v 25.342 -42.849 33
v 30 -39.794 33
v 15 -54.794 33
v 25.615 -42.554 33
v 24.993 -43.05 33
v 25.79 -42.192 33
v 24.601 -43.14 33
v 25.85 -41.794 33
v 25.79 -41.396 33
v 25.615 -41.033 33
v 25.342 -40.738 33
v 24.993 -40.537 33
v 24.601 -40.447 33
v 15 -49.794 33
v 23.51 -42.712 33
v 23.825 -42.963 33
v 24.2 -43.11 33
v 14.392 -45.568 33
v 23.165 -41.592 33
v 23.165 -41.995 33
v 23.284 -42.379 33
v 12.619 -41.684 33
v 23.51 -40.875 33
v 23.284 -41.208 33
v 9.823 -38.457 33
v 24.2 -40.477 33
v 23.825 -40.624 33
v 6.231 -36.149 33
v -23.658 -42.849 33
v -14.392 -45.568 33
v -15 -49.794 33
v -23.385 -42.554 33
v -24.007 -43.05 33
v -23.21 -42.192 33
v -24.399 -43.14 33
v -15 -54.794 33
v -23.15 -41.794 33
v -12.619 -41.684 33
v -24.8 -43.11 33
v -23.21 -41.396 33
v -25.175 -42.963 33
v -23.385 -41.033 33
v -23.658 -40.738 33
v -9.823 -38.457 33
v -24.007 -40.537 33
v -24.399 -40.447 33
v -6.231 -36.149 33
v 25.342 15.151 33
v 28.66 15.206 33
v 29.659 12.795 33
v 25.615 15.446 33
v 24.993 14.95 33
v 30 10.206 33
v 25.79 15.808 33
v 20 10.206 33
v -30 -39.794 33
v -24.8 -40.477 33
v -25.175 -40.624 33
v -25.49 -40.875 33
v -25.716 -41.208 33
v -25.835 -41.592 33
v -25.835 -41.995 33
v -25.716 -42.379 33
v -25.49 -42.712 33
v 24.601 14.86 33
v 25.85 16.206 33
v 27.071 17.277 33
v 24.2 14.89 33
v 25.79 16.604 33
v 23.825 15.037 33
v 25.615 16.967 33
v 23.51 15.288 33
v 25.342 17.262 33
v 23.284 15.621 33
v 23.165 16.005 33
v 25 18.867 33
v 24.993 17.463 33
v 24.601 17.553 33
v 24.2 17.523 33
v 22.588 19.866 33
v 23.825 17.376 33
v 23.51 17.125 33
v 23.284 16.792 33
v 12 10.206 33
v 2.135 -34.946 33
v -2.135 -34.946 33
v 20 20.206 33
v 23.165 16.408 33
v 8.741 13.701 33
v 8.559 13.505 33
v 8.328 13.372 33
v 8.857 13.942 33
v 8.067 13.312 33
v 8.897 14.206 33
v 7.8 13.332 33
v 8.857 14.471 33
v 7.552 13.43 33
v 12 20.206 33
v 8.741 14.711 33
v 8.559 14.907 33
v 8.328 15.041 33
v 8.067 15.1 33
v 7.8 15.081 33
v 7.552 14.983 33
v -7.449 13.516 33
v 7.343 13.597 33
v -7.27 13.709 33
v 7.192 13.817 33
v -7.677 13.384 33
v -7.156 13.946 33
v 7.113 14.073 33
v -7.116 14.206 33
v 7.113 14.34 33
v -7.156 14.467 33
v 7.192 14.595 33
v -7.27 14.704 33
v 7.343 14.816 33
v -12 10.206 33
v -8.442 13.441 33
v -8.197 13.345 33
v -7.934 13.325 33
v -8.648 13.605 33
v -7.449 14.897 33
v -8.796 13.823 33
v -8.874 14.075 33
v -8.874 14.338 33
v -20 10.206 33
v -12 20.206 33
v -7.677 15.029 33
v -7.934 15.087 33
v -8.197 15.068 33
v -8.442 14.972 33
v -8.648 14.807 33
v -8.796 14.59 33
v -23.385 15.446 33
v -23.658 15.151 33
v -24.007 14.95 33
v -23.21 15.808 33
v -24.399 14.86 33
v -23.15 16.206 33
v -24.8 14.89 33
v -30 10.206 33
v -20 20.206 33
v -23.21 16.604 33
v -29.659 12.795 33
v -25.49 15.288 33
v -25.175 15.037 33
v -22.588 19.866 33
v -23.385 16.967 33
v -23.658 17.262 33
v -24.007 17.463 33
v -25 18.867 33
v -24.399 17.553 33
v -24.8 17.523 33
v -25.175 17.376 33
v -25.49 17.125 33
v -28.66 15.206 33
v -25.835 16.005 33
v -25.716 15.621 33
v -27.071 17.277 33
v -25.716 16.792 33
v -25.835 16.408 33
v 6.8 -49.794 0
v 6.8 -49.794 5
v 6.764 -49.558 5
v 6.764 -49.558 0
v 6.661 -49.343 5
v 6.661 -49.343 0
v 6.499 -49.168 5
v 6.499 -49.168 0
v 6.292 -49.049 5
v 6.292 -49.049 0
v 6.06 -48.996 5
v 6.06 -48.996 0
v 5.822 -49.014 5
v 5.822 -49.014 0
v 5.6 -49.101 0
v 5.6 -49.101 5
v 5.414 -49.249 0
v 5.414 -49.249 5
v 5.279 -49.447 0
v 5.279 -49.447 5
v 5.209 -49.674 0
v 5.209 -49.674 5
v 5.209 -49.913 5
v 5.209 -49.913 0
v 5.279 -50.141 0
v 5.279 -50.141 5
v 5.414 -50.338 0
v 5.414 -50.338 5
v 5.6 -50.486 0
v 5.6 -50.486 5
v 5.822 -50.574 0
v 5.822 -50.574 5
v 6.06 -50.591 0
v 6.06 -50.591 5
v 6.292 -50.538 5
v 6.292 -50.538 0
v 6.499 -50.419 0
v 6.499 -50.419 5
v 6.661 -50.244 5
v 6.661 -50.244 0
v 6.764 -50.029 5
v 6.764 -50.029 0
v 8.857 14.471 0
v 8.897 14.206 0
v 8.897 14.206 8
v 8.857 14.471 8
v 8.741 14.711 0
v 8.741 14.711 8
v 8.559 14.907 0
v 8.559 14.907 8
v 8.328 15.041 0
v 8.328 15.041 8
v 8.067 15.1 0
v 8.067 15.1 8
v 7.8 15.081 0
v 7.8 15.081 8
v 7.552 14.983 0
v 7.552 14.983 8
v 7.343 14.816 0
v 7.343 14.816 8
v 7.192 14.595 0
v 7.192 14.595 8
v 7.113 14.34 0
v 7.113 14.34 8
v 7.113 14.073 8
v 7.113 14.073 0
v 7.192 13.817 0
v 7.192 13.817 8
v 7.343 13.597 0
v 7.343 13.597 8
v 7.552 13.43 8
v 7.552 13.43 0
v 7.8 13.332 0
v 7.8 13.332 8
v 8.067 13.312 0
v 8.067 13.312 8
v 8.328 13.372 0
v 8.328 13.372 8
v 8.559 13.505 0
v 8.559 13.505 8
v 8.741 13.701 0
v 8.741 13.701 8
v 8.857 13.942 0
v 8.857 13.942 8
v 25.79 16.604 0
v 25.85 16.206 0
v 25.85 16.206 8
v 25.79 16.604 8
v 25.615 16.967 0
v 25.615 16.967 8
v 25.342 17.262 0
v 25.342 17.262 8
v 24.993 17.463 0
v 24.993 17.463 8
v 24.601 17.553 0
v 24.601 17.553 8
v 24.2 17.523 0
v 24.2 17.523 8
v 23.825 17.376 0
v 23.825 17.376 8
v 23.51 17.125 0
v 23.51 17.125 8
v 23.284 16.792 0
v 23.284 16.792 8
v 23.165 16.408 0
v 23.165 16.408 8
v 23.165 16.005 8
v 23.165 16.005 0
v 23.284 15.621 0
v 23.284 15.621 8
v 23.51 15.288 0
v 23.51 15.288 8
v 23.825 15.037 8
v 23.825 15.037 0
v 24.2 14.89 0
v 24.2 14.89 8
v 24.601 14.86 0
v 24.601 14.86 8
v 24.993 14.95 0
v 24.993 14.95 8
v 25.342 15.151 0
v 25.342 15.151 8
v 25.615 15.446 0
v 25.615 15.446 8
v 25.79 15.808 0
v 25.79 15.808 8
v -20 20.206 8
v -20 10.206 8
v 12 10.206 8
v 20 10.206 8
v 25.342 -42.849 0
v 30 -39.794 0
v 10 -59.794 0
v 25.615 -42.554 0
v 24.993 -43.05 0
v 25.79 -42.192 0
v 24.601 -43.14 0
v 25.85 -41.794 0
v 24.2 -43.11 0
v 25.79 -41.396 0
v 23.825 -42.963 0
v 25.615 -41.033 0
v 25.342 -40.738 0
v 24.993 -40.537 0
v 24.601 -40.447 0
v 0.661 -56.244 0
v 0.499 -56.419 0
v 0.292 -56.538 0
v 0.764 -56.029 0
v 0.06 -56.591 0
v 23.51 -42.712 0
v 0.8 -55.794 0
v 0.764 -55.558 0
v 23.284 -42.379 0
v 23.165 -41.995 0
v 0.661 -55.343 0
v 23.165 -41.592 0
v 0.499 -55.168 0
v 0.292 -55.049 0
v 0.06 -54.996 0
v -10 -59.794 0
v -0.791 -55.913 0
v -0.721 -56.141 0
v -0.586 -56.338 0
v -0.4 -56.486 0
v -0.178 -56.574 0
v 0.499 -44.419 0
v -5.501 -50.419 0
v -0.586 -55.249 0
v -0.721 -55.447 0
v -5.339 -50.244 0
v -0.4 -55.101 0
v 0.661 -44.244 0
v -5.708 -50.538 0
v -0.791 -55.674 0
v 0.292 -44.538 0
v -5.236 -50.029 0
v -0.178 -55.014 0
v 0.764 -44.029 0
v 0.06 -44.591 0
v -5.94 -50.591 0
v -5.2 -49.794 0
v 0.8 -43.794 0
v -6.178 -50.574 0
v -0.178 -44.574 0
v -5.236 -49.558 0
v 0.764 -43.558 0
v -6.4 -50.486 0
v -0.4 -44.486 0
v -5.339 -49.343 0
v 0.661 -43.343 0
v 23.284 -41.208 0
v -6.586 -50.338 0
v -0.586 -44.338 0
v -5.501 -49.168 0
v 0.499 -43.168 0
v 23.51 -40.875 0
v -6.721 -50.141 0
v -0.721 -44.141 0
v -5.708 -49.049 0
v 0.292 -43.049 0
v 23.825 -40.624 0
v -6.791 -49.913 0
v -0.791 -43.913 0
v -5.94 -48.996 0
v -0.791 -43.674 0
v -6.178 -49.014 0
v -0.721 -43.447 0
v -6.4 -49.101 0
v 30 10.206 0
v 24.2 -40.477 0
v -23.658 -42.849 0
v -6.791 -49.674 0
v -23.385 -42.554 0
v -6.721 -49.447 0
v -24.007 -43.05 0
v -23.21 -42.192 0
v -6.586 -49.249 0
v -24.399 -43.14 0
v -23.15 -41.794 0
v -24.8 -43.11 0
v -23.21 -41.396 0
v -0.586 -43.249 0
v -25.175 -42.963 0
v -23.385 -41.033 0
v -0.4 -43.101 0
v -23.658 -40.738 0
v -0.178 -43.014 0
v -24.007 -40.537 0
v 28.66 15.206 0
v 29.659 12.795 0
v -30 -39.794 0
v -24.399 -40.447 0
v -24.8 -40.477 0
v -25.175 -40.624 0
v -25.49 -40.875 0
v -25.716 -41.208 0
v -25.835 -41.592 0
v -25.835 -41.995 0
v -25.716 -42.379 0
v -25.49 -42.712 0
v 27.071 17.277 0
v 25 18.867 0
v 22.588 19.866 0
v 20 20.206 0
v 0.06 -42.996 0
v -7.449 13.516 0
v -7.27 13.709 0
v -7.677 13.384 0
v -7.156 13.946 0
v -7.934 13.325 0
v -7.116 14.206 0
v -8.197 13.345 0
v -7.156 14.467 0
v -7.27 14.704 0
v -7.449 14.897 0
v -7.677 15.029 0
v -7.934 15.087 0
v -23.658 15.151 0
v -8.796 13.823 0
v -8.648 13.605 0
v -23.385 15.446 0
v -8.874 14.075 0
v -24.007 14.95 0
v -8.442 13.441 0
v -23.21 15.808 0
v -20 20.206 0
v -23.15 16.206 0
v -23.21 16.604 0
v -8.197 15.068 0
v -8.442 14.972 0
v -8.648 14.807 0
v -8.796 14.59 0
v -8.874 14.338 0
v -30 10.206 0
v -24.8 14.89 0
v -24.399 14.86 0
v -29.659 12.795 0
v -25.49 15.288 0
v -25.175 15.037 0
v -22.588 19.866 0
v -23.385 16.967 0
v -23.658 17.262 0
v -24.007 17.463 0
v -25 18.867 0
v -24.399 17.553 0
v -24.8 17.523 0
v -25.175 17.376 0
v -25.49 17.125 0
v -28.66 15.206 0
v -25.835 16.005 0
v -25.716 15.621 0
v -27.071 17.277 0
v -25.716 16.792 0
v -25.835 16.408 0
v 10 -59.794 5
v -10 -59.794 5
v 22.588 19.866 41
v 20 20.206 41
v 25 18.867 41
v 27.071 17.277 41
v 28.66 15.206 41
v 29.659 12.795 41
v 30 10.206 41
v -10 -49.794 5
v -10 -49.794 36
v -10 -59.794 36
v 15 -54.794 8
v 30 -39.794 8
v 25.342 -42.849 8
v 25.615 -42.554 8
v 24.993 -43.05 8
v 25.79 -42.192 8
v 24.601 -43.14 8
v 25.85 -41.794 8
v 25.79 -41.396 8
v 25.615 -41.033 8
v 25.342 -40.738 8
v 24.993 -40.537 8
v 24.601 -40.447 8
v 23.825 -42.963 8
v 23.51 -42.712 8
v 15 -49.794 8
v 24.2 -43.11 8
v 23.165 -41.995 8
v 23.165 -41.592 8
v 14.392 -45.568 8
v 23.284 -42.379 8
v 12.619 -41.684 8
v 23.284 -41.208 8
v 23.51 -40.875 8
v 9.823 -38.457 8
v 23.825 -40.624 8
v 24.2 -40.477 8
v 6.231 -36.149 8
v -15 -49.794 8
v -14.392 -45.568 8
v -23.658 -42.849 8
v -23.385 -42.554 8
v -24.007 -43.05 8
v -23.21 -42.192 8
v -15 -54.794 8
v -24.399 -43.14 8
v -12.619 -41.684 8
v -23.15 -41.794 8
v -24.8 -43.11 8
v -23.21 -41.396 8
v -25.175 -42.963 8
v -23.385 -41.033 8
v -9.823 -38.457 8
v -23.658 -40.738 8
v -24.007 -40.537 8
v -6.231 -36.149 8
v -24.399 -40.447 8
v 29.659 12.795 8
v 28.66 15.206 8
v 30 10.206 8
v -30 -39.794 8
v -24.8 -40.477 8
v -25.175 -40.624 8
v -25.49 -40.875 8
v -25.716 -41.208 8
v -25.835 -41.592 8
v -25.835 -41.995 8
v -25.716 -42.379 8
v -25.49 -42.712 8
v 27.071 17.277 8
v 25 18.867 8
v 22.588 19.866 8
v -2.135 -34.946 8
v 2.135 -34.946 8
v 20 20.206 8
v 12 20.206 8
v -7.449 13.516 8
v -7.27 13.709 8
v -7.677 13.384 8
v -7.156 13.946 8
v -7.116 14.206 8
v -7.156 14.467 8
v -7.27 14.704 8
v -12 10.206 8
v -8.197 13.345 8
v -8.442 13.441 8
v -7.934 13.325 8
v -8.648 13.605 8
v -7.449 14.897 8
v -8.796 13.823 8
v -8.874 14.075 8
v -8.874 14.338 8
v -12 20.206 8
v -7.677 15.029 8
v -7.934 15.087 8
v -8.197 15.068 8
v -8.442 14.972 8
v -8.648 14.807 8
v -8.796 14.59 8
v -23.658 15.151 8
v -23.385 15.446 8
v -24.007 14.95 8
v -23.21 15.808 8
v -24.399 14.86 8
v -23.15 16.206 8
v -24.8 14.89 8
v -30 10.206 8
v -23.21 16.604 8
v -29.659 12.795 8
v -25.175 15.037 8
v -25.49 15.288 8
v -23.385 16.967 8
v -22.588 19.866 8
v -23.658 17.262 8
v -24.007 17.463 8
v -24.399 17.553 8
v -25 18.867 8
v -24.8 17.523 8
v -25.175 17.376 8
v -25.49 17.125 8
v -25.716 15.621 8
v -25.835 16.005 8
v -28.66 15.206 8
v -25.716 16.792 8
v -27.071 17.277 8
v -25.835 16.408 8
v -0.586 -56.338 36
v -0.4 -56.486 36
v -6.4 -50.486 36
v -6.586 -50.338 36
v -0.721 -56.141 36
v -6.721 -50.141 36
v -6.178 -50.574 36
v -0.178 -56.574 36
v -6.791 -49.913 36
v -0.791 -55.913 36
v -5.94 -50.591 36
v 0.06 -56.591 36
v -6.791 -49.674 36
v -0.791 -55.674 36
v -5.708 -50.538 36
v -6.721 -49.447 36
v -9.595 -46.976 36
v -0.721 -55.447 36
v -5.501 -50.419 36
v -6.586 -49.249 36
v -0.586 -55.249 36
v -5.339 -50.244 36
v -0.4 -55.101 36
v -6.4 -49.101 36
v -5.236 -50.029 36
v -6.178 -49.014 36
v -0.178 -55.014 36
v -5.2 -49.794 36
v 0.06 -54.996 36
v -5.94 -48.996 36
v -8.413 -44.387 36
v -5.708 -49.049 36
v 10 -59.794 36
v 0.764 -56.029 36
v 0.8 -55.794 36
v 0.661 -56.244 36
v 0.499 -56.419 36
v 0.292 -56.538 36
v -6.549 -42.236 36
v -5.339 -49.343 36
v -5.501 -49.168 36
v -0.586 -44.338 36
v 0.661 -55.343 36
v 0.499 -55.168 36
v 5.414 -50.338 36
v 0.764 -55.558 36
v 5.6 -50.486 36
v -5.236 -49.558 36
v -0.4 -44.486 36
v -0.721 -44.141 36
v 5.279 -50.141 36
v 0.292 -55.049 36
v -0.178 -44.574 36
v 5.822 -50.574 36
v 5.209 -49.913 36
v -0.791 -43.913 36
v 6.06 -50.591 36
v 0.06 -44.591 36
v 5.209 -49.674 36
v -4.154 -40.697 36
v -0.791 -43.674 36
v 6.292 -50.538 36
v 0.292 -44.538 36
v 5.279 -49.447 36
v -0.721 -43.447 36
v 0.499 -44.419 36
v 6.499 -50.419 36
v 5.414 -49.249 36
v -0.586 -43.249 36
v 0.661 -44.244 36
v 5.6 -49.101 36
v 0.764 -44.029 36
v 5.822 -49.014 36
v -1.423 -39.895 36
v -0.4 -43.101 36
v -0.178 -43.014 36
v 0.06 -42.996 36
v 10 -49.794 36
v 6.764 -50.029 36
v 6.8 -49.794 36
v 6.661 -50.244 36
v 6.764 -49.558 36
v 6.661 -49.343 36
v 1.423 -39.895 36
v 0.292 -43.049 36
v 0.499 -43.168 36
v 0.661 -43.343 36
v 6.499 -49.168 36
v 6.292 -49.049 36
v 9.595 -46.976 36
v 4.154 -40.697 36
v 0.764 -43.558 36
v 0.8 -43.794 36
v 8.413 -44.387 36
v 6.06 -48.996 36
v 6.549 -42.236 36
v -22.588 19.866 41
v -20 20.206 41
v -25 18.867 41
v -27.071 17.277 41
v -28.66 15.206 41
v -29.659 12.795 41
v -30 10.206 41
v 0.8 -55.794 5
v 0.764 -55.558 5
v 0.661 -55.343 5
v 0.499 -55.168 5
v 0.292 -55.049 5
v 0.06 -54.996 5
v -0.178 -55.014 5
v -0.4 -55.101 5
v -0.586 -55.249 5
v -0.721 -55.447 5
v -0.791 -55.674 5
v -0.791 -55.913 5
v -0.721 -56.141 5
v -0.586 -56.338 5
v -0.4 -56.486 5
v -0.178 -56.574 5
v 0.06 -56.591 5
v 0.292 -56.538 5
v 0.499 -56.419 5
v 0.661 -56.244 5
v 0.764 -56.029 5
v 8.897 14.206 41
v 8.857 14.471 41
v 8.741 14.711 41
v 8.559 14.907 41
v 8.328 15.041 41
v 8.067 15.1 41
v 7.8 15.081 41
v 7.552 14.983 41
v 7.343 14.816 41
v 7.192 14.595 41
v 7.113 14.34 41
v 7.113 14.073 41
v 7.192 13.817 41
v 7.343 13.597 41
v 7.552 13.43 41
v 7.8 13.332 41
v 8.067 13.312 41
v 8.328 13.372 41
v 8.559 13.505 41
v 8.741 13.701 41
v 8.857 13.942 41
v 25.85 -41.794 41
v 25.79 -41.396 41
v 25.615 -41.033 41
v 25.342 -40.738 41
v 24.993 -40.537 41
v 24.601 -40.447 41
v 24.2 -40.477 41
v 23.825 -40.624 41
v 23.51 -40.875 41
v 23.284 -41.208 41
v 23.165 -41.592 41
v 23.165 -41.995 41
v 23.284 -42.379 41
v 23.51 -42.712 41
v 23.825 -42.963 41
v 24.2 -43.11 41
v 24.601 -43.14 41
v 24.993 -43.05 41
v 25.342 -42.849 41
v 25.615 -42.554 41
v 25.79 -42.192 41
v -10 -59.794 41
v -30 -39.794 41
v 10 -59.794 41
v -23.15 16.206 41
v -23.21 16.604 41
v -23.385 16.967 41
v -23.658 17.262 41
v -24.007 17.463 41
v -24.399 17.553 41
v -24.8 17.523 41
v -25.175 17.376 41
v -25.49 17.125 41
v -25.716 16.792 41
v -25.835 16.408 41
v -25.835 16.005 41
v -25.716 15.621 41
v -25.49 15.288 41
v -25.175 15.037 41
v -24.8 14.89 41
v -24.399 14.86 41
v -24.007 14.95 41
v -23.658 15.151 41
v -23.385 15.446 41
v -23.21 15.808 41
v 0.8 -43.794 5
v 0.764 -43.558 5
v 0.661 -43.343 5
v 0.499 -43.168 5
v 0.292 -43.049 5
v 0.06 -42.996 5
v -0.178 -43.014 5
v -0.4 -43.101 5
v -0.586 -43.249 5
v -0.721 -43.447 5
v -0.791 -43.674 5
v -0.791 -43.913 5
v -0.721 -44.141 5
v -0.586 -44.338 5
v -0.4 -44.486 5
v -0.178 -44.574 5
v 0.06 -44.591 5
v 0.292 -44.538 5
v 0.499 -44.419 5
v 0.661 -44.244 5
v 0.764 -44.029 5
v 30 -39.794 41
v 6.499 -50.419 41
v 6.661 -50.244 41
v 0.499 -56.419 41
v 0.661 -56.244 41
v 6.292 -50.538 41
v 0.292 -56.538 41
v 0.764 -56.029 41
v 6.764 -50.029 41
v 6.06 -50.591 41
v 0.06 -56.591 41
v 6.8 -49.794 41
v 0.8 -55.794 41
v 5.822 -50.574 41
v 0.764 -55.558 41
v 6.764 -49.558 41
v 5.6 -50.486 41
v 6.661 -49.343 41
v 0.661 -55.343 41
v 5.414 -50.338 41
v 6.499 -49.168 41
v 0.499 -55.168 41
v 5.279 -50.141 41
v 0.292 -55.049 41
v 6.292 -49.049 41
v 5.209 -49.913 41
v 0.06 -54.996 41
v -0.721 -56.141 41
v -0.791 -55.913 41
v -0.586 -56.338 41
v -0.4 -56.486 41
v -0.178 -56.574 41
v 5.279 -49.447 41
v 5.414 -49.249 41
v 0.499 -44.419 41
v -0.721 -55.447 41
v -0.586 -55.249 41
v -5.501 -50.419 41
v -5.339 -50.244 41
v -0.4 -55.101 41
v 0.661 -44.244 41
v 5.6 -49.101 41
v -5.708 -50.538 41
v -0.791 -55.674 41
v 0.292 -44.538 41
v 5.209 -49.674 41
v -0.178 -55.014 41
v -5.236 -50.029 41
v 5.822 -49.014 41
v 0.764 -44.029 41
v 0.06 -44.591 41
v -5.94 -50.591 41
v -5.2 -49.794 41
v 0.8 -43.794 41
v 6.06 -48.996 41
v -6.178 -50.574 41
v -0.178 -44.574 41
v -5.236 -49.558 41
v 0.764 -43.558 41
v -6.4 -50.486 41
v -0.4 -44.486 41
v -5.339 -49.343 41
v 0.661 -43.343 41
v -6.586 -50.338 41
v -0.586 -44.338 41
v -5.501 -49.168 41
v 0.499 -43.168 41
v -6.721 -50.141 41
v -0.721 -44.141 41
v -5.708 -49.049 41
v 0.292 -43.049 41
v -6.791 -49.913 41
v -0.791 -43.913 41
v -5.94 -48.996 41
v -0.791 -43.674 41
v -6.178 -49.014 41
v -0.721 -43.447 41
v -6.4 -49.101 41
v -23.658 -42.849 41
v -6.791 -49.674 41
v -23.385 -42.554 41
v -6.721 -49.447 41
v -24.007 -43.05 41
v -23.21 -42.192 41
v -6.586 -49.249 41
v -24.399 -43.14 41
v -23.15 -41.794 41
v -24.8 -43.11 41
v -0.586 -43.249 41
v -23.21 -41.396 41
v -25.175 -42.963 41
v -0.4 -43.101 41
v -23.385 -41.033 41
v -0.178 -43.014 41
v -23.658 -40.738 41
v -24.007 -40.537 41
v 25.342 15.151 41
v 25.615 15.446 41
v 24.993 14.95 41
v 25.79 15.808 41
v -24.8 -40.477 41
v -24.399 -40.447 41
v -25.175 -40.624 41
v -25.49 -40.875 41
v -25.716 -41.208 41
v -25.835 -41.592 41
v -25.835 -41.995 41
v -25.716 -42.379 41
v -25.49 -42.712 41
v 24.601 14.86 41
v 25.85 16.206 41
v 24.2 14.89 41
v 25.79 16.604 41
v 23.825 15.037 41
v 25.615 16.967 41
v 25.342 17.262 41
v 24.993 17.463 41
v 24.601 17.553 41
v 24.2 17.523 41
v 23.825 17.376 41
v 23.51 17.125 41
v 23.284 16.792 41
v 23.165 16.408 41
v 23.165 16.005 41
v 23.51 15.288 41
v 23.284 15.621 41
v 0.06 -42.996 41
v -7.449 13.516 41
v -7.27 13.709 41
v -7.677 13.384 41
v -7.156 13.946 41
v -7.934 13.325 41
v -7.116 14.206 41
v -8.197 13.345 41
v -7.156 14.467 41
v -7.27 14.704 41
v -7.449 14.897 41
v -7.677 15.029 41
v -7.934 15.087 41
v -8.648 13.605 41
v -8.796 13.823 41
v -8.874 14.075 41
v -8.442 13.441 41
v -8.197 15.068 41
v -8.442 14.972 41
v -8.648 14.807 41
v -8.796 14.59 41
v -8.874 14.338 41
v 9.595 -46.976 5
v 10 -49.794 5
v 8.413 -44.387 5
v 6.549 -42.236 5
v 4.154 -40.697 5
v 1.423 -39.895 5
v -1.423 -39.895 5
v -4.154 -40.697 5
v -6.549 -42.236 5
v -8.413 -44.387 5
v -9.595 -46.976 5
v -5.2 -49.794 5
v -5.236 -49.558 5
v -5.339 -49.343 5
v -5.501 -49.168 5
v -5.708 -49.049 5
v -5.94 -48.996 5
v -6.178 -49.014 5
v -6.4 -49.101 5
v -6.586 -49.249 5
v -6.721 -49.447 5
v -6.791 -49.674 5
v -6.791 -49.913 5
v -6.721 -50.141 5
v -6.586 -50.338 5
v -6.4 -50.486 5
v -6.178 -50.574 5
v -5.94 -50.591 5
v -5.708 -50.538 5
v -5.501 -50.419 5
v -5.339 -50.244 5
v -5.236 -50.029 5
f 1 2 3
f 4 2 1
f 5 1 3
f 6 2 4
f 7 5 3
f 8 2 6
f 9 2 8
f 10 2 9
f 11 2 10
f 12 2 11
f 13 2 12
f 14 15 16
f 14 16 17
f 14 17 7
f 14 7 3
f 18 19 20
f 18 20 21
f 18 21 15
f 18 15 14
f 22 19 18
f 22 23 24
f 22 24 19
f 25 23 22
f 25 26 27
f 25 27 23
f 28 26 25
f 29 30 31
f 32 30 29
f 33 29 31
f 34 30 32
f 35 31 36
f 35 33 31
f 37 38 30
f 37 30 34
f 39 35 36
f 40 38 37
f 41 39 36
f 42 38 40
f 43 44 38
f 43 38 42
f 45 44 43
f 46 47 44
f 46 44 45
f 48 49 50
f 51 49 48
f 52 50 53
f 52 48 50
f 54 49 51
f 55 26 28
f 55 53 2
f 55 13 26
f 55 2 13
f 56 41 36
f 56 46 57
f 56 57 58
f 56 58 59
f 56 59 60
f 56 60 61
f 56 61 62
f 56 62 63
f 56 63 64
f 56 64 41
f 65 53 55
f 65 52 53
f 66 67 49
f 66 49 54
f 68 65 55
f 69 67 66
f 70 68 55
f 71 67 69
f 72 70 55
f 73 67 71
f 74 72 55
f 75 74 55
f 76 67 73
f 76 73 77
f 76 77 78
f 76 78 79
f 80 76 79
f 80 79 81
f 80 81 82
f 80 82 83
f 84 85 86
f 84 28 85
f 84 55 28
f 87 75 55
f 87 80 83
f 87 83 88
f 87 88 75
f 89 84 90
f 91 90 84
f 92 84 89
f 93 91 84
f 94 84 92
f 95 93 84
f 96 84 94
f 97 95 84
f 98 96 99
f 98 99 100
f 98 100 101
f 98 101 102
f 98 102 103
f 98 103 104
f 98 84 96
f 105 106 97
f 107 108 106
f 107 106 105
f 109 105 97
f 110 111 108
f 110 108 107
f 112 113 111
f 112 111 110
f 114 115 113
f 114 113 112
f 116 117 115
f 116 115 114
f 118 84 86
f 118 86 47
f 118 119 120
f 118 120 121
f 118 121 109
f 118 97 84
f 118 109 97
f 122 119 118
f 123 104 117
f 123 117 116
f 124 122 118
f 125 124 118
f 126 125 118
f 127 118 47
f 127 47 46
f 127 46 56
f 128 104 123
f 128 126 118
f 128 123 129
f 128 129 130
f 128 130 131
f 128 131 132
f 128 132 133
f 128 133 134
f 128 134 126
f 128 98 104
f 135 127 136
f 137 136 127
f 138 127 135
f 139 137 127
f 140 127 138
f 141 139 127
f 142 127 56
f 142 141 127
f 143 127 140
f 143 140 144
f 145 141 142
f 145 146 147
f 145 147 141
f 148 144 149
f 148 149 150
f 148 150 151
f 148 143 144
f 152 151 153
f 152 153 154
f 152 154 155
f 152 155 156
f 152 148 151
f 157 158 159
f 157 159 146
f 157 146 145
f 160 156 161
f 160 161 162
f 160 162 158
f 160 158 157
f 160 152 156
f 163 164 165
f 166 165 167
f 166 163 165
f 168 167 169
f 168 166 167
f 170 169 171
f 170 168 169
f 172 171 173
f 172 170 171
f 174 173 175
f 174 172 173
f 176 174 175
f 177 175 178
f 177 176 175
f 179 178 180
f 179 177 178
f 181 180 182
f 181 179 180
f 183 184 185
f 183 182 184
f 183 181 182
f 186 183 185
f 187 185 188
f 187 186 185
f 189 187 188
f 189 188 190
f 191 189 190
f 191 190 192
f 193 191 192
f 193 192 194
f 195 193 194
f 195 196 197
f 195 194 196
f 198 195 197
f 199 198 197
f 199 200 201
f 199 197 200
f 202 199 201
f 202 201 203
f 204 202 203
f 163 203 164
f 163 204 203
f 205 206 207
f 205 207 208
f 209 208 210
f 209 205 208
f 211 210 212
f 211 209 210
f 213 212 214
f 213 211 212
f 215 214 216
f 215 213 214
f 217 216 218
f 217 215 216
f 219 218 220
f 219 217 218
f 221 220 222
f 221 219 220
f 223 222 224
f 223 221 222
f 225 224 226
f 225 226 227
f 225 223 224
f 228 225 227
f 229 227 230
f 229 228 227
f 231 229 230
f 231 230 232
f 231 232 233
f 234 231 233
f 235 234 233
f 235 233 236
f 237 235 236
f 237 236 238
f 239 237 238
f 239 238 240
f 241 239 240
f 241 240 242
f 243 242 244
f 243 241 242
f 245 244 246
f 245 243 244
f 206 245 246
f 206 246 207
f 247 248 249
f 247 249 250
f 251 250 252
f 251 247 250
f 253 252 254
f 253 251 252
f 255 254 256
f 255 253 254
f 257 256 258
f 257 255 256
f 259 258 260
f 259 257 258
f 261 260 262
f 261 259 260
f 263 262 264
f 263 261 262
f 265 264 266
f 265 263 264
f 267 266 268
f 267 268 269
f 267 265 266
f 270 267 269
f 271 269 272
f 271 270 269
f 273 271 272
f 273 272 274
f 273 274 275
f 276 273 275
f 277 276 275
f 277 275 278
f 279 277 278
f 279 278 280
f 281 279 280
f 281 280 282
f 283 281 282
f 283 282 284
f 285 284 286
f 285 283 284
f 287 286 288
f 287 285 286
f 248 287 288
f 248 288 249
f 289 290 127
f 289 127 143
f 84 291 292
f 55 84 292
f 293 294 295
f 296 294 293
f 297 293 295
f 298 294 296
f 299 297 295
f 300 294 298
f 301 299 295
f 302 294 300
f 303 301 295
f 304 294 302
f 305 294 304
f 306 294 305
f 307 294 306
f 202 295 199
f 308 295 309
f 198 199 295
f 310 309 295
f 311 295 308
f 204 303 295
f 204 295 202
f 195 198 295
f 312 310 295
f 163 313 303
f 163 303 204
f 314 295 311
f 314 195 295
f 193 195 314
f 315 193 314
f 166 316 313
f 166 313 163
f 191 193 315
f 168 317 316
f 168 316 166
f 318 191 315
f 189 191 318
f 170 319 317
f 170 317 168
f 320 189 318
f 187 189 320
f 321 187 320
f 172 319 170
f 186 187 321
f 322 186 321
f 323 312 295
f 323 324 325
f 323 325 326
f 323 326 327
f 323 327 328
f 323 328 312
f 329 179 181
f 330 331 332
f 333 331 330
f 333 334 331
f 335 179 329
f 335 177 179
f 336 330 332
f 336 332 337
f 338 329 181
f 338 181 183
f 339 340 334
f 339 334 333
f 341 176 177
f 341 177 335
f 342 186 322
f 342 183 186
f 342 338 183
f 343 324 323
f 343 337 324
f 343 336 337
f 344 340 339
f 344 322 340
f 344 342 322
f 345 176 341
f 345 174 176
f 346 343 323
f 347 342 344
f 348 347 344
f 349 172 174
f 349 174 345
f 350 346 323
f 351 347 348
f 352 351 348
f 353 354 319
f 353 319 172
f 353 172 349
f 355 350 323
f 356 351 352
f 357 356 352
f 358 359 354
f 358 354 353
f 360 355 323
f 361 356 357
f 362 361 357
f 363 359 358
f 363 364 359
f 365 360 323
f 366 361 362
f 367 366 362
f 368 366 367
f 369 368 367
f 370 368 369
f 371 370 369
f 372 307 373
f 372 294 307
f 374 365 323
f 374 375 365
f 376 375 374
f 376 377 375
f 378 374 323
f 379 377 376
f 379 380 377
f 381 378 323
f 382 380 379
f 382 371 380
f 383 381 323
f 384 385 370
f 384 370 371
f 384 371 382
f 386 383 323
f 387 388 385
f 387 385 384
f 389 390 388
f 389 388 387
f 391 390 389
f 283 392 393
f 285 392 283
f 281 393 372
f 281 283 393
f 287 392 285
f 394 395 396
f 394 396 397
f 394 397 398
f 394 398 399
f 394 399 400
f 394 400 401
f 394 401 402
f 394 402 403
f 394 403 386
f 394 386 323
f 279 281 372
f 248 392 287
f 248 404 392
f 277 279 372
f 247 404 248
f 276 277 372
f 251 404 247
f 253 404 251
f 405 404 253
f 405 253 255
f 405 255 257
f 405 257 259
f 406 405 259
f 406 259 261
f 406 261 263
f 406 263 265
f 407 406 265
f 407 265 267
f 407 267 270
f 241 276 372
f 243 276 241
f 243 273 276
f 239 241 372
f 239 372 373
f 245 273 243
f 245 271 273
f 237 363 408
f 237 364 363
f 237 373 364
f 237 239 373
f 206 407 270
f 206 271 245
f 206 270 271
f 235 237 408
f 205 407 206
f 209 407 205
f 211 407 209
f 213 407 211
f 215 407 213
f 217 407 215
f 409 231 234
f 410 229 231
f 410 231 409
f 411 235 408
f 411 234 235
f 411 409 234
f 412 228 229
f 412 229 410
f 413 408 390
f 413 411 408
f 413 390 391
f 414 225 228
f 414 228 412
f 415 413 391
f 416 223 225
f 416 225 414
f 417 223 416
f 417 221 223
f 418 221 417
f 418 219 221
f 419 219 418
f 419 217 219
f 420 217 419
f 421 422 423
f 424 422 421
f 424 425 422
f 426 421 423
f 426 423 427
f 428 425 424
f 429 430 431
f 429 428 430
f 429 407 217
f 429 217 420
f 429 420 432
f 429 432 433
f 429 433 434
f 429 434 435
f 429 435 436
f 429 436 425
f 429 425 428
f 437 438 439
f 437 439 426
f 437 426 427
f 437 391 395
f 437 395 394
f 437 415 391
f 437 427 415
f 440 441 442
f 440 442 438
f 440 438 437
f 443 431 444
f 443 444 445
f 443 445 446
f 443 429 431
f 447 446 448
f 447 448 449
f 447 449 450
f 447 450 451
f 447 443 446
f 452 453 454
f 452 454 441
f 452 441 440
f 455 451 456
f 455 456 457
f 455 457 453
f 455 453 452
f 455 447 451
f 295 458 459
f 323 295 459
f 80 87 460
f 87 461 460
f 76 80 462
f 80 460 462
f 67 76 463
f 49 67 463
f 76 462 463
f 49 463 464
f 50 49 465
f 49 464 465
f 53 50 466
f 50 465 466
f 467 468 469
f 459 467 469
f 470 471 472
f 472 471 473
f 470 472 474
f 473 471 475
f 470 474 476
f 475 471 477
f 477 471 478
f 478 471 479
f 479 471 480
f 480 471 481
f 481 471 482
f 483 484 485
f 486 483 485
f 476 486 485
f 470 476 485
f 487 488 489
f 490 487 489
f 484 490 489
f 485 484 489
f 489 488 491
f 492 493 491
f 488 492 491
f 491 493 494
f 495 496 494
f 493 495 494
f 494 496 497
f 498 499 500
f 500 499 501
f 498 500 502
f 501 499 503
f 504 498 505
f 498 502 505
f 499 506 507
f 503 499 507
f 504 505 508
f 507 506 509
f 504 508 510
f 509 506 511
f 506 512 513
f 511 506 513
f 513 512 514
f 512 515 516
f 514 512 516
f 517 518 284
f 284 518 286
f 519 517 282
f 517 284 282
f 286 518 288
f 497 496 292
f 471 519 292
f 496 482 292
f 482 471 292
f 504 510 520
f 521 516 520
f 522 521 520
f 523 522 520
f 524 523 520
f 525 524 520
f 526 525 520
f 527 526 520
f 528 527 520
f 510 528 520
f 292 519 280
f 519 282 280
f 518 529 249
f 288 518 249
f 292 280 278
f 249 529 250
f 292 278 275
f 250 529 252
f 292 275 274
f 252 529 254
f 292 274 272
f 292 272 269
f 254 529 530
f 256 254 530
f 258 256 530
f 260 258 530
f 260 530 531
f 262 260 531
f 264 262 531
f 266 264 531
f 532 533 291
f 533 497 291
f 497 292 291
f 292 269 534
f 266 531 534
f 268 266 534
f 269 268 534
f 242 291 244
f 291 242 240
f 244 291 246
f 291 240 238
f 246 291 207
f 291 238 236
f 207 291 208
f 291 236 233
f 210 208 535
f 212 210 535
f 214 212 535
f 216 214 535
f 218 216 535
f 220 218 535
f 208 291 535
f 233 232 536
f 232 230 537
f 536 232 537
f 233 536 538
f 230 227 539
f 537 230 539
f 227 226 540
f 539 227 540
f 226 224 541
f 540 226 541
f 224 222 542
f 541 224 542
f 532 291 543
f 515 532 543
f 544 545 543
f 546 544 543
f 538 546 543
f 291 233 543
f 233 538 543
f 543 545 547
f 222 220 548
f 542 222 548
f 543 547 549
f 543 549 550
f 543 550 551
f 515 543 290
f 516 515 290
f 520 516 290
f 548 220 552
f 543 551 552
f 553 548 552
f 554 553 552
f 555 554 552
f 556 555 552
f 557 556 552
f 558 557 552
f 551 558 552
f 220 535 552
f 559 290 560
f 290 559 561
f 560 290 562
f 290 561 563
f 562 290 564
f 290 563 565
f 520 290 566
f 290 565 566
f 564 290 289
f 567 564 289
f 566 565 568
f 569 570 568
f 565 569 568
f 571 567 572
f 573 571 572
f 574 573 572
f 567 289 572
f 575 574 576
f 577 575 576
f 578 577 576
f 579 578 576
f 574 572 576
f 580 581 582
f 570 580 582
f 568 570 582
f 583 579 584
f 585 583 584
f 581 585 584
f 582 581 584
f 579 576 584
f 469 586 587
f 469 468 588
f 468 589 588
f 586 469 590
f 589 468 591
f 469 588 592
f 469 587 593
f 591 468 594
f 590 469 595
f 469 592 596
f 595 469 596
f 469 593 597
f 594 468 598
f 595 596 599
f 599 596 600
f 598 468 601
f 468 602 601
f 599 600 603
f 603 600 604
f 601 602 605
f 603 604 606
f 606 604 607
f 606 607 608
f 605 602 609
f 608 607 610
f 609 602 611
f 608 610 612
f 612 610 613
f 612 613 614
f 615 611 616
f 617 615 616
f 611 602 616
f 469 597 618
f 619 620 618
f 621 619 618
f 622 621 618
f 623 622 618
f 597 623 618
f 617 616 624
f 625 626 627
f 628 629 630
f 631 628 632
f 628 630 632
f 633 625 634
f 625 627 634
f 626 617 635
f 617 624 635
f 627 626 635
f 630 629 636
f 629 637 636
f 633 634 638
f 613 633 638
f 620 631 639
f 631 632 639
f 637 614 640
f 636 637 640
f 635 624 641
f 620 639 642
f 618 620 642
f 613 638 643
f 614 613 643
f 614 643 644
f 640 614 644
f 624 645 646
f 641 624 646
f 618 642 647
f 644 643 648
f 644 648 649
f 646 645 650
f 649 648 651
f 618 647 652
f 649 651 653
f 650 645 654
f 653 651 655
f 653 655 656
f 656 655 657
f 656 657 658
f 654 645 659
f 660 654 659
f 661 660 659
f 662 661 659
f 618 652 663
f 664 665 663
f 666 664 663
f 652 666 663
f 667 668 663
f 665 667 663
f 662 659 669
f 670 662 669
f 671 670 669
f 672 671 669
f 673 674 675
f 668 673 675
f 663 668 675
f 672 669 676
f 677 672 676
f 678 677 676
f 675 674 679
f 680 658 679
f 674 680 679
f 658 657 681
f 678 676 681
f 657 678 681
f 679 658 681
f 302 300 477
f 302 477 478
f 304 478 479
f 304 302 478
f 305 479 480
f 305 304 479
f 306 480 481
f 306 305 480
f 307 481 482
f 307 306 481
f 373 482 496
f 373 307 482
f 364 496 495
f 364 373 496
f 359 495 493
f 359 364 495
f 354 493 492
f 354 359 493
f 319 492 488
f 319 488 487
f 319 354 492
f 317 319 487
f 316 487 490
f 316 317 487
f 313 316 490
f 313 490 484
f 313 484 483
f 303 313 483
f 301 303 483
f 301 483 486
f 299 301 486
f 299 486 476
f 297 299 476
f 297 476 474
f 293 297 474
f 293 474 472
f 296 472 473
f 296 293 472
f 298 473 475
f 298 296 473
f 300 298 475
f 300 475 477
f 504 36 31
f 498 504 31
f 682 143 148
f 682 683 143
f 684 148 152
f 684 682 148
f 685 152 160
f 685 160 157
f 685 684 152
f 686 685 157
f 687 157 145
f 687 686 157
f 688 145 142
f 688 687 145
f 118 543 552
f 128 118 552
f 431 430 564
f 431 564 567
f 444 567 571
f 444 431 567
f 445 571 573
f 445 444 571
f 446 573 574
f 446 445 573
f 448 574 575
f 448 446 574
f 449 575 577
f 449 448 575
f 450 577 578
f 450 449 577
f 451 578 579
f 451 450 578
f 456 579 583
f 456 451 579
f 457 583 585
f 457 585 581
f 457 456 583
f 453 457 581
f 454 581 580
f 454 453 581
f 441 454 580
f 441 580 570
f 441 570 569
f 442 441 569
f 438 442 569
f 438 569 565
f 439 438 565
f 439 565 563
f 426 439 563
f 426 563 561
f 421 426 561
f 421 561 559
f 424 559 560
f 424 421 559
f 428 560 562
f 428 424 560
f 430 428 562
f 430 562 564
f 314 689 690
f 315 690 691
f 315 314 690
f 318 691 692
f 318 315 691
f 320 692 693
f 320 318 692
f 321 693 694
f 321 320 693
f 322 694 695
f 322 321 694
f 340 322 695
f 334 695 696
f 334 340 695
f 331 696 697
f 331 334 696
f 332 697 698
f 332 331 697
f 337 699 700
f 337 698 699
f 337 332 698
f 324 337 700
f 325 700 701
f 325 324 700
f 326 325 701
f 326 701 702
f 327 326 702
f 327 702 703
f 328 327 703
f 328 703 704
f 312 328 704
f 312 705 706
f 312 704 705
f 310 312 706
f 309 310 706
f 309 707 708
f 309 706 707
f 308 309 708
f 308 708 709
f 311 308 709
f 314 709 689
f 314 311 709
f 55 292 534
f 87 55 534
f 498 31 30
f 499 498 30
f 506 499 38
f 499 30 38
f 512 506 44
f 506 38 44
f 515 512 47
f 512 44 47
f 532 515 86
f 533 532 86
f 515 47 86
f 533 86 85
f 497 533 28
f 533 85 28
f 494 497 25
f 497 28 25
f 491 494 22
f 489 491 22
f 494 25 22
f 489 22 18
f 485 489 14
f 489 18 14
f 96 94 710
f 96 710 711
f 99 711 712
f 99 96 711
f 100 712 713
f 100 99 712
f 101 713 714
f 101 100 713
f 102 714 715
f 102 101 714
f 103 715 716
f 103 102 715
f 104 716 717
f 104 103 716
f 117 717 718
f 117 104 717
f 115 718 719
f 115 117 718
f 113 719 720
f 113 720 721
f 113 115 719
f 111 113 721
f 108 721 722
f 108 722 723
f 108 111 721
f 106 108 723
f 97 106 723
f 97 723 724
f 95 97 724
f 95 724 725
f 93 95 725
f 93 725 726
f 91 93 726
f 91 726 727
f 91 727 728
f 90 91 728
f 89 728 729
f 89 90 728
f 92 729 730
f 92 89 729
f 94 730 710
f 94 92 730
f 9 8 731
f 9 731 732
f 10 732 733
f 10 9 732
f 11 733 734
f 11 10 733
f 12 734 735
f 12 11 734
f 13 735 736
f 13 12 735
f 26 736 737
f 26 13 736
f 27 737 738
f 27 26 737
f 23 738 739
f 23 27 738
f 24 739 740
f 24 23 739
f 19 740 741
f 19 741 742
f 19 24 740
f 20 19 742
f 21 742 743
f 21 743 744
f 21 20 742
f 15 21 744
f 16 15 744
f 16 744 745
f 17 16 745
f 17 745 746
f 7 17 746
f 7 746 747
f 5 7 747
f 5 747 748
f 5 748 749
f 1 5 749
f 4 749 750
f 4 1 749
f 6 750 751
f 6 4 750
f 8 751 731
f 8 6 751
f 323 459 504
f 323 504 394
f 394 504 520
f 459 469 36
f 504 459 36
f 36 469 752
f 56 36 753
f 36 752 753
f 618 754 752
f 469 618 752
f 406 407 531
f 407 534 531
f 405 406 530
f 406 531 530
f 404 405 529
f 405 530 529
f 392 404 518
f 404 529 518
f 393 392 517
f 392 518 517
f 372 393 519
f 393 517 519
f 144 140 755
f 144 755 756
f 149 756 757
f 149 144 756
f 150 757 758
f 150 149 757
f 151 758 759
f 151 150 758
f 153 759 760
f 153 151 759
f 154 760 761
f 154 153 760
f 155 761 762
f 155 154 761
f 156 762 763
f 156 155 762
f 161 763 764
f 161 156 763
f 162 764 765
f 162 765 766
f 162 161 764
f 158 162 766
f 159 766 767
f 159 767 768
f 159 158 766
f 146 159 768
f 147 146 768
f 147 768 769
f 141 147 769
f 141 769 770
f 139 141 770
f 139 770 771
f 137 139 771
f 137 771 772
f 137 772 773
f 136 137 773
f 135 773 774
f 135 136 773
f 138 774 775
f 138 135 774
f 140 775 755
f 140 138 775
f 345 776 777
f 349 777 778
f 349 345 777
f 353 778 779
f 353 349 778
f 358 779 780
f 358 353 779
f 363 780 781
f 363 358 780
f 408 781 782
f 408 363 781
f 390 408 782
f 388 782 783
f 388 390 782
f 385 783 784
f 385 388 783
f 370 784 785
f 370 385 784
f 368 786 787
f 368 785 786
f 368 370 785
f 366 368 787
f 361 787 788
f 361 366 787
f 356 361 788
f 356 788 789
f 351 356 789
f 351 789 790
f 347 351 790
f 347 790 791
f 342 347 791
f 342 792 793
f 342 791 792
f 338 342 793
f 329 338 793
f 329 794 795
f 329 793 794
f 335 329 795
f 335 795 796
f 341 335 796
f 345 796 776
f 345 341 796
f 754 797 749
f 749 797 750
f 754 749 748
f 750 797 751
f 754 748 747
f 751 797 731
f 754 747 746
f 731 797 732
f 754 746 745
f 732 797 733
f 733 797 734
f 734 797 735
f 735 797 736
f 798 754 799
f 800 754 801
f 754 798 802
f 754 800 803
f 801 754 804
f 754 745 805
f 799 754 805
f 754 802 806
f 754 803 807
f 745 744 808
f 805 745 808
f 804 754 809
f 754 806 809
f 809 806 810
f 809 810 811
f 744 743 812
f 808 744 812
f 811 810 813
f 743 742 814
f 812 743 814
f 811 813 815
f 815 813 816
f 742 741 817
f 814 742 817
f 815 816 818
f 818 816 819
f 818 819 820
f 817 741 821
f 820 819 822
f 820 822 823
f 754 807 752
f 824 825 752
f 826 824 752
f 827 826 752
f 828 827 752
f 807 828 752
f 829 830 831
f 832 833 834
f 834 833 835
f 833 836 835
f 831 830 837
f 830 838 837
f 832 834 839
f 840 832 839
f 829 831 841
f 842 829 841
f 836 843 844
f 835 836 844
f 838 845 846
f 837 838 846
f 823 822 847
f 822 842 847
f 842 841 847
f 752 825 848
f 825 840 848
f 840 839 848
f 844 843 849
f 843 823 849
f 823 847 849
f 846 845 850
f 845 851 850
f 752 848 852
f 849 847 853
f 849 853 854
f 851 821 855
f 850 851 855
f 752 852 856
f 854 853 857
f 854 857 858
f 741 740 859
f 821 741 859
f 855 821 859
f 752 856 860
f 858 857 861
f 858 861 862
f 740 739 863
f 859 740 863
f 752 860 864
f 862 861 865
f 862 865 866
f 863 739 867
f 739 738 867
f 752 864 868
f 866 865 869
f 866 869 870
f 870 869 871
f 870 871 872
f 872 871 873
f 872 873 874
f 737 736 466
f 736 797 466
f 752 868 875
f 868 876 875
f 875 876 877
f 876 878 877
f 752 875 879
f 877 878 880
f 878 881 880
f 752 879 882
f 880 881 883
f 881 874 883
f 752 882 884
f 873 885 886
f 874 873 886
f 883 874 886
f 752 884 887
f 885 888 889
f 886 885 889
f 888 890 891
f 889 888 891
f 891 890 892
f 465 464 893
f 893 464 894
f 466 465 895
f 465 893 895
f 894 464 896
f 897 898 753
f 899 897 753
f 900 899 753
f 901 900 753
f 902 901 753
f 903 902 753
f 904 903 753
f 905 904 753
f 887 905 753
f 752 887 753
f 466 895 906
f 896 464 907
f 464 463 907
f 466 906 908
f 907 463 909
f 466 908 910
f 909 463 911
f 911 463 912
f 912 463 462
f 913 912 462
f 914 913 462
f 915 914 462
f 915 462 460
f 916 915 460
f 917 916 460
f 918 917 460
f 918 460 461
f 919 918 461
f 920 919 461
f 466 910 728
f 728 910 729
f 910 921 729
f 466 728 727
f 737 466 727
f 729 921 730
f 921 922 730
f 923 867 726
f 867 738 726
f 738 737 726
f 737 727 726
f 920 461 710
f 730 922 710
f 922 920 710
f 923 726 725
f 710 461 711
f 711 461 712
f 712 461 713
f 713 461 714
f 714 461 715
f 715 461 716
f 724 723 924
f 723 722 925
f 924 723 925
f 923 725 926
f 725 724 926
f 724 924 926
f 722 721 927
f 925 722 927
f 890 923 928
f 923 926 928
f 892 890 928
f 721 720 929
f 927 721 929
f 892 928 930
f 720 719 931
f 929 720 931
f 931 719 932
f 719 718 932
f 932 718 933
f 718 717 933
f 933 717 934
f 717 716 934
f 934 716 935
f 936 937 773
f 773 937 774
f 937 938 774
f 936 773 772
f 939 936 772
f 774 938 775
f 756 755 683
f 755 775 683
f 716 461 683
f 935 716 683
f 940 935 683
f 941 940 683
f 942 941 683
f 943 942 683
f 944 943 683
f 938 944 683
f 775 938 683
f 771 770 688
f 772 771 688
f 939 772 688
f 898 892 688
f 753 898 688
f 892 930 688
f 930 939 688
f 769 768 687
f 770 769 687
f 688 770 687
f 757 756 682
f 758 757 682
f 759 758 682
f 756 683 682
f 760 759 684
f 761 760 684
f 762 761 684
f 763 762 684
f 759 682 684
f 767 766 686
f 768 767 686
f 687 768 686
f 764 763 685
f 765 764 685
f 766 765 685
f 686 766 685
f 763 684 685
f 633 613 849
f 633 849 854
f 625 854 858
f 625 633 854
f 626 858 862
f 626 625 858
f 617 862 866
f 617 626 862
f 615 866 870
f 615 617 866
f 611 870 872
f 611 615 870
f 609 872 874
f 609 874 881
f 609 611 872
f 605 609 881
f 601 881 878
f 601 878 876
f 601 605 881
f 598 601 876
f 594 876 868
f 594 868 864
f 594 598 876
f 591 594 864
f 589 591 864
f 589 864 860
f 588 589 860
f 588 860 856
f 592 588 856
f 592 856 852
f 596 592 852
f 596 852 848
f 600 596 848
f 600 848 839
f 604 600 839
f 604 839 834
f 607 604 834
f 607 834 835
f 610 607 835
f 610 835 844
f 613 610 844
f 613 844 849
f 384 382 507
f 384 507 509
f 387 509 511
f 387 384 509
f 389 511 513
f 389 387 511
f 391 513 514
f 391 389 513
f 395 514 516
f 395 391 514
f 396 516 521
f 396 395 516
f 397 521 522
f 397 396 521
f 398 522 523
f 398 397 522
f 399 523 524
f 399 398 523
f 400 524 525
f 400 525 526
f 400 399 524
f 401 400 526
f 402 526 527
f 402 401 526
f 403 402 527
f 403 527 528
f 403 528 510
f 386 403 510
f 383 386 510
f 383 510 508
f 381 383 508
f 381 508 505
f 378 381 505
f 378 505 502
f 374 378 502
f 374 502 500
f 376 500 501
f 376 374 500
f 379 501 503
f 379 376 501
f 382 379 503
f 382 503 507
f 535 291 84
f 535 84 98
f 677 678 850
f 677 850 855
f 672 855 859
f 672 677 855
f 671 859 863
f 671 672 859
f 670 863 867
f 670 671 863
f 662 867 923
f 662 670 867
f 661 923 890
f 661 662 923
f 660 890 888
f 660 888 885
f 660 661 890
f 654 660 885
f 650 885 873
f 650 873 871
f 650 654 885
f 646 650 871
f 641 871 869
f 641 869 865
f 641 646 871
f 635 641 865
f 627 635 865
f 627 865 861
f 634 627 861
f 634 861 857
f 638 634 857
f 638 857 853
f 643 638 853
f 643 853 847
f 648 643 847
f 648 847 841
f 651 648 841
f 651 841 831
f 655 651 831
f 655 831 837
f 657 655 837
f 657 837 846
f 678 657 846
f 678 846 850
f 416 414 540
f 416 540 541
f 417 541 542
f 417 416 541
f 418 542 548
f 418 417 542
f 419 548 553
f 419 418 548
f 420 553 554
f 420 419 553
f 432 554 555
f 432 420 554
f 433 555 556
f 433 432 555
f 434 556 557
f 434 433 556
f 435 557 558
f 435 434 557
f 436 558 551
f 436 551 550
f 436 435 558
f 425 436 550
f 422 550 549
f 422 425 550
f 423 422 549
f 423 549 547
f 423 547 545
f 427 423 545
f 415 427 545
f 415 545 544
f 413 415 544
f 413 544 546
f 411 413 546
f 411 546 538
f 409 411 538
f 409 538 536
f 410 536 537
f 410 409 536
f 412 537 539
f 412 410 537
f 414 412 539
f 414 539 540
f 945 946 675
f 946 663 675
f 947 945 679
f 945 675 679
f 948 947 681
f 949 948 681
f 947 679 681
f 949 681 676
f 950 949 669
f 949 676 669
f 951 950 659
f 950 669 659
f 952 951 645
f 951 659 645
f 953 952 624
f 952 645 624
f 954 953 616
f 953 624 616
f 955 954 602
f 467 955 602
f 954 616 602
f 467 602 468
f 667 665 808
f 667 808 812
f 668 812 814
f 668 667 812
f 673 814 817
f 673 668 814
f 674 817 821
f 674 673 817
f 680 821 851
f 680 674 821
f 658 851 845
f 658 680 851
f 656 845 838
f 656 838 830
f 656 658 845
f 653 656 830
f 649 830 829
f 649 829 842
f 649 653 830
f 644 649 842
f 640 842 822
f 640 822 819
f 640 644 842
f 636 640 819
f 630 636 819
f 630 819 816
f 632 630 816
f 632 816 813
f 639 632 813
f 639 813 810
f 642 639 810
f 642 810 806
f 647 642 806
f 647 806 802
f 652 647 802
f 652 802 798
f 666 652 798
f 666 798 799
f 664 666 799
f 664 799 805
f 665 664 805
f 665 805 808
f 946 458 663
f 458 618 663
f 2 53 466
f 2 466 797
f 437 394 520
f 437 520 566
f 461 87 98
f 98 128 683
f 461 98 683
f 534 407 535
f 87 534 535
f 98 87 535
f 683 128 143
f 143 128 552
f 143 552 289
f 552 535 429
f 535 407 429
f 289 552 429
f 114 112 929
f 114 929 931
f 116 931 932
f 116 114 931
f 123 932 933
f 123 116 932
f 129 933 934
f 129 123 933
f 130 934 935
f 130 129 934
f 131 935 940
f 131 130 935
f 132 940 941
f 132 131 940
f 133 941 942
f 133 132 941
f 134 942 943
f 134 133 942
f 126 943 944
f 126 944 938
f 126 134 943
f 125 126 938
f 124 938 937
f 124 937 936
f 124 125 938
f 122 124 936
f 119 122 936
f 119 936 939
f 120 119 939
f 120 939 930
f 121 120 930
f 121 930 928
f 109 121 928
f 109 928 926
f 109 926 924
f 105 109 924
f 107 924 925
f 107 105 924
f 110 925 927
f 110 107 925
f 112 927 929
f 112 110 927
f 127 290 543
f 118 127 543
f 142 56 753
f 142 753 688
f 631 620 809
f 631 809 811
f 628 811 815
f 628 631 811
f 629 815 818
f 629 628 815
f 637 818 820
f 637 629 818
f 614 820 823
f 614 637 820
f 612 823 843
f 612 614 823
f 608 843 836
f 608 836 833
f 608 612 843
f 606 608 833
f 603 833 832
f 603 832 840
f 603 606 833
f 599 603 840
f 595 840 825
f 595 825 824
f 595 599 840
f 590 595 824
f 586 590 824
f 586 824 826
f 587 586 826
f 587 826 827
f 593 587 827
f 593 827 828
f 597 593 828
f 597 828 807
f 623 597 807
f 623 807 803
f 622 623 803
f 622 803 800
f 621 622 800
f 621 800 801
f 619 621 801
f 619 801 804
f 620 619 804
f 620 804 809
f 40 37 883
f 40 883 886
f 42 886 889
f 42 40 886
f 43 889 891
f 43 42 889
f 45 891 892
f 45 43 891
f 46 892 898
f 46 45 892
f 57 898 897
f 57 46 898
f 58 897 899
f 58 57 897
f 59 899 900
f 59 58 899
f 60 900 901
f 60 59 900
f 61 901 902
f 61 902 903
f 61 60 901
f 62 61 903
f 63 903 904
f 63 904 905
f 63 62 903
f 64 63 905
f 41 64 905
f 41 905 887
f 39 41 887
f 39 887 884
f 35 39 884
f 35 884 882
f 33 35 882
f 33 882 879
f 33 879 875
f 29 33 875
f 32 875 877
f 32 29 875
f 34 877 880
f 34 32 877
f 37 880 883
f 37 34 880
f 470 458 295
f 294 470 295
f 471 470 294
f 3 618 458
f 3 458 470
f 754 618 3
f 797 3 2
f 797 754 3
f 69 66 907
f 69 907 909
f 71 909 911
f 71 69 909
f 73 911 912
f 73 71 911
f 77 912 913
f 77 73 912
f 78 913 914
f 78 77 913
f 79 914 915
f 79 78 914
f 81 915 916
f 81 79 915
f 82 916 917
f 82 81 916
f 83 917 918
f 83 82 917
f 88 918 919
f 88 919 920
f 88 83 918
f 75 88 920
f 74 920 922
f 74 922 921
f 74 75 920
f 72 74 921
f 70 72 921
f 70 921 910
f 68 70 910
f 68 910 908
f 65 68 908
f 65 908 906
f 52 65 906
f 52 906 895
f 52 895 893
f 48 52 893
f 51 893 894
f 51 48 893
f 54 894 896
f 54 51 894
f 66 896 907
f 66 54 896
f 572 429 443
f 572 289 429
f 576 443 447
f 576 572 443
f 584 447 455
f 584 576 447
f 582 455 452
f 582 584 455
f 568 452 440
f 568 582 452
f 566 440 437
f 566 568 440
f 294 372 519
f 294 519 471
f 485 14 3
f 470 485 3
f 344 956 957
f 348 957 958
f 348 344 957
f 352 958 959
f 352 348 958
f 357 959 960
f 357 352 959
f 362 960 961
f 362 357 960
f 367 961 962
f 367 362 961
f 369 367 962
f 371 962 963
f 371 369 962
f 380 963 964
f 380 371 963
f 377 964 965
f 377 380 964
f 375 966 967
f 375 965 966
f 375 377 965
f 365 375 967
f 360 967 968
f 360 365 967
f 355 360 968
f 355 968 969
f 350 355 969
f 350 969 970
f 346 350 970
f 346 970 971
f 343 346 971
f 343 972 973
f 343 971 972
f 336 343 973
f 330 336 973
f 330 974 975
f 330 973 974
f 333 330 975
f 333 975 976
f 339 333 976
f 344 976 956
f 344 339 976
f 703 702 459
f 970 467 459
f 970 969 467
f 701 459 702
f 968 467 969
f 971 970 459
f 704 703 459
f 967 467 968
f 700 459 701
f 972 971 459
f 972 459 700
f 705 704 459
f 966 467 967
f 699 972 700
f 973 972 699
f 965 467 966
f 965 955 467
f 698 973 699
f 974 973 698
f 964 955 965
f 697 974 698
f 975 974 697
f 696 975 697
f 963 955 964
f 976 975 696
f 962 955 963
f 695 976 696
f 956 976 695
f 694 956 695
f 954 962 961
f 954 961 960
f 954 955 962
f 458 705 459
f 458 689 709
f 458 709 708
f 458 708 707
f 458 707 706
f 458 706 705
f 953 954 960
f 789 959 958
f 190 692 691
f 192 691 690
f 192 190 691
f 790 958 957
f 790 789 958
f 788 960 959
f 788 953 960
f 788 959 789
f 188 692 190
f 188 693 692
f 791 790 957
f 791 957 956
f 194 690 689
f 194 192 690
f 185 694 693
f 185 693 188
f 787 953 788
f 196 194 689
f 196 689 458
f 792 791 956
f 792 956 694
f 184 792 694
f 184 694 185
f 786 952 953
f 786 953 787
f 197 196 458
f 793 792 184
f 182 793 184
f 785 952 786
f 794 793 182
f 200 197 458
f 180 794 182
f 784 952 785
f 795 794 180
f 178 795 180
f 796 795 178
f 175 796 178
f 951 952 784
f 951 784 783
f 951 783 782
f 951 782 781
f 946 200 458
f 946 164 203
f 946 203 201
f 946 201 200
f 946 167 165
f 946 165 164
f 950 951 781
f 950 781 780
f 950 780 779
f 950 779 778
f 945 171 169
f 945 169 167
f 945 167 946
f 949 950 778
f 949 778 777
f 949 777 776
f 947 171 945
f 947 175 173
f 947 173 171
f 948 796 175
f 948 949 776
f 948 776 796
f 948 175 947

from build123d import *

# Parameters (mm, degrees)
SKETCH1_R           = 0.883567379
SKETCH1_R_2         = 0.896609669
SKETCH1_R_3         = 0.8
SKETCH1_R_4         = 1.35
BOSS_EXTRUDE1_DEPTH = 8
SKETCH2_W           = 8
SKETCH2_H           = 10
BOSS_EXTRUDE3_DEPTH = 25
BOSS_EXTRUDE4_START = 33
SKETCH1_2_R         = 0.883567379
SKETCH1_2_R_2       = 0.896609669
SKETCH1_2_R_3       = 0.8
SKETCH1_2_R_4       = 1.35
BOSS_EXTRUDE4_DEPTH = 8
CUT_EXTRUDE1_DEPTH  = 3
CUT_EXTRUDE2_START  = 28
CUT_EXTRUDE2_DEPTH  = 3
BOSS_EXTRUDE5_DEPTH = 25
CUT_EXTRUDE3_DEPTH  = 41
FILLET5_R           = 10


with BuildPart() as part:
    # Sketch1 → Boss-Extrude1 (new body)
    with BuildSketch(Plane.XY):
        Polygon((-30, 20.206387144), (0, 20.206387144), (30, 20.206387144), (30, -59.793612856), (-30, -59.793612856), align=None)
        with Locations((-8, 14.206387144)):
            Circle(SKETCH1_R, mode=Mode.SUBTRACT)
        with Locations((8, 14.206387144)):
            Circle(SKETCH1_R_2, mode=Mode.SUBTRACT)
        with Locations((0, -43.793612856)):
            Circle(SKETCH1_R_3, mode=Mode.SUBTRACT)
        with Locations((6, -49.793612856)):
            Circle(SKETCH1_R_3, mode=Mode.SUBTRACT)
        with Locations((0, -55.793612856)):
            Circle(SKETCH1_R_3, mode=Mode.SUBTRACT)
        with Locations((-6, -49.793612856)):
            Circle(SKETCH1_R_3, mode=Mode.SUBTRACT)
        with Locations((-24.5, 16.206387144)):
            Circle(SKETCH1_R_4, mode=Mode.SUBTRACT)
        with Locations((24.5, 16.206387144)):
            Circle(SKETCH1_R_4, mode=Mode.SUBTRACT)
        with Locations((-24.5, -41.793612856)):
            Circle(SKETCH1_R_4, mode=Mode.SUBTRACT)
        with Locations((24.5, -41.793612856)):
            Circle(SKETCH1_R_4, mode=Mode.SUBTRACT)
    extrude(amount=BOSS_EXTRUDE1_DEPTH)

    # Sketch2 → Boss-Extrude3 (add)
    with BuildSketch(Plane.XY.offset(8)):
        with Locations((-16, 15.206387144)):
            Rectangle(SKETCH2_W, SKETCH2_H)
        with Locations((16, 15.206387144)):
            Rectangle(SKETCH2_W, SKETCH2_H)
    extrude(amount=BOSS_EXTRUDE3_DEPTH)

    # Sketch1<2> → Boss-Extrude4 (add)
    with BuildSketch(Plane.XY.offset(BOSS_EXTRUDE4_START)):
        Polygon((-30, 20.206387144), (0, 20.206387144), (30, 20.206387144), (30, -59.793612856), (-30, -59.793612856), align=None)
        with Locations((-8, 14.206387144)):
            Circle(SKETCH1_2_R, mode=Mode.SUBTRACT)
        with Locations((8, 14.206387144)):
            Circle(SKETCH1_2_R_2, mode=Mode.SUBTRACT)
        with Locations((0, -43.793612856)):
            Circle(SKETCH1_2_R_3, mode=Mode.SUBTRACT)
        with Locations((6, -49.793612856)):
            Circle(SKETCH1_2_R_3, mode=Mode.SUBTRACT)
        with Locations((0, -55.793612856)):
            Circle(SKETCH1_2_R_3, mode=Mode.SUBTRACT)
        with Locations((-6, -49.793612856)):
            Circle(SKETCH1_2_R_3, mode=Mode.SUBTRACT)
        with Locations((-24.5, 16.206387144)):
            Circle(SKETCH1_2_R_4, mode=Mode.SUBTRACT)
        with Locations((24.5, 16.206387144)):
            Circle(SKETCH1_2_R_4, mode=Mode.SUBTRACT)
        with Locations((-24.5, -41.793612856)):
            Circle(SKETCH1_2_R_4, mode=Mode.SUBTRACT)
        with Locations((24.5, -41.793612856)):
            Circle(SKETCH1_2_R_4, mode=Mode.SUBTRACT)
    extrude(amount=BOSS_EXTRUDE4_DEPTH)

    # Sketch3 → Cut-Extrude1 (cut)
    with BuildSketch(Plane.XY.offset(8)):
        with BuildLine():
            Line((-10, -49.793612856), (-10, -59.793612856))
            Line((-10, -59.793612856), (10, -59.793612856))
            Line((10, -59.793612856), (10, -49.793612856))
            ThreePointArc((10, -49.793612856), (0, -39.793612856), (-10, -49.793612856))
        make_face()
    extrude(amount=-CUT_EXTRUDE1_DEPTH, mode=Mode.SUBTRACT)

    # Sketch3<2> → Cut-Extrude2 (cut)
    with BuildSketch(Plane.XY.offset(8).offset(CUT_EXTRUDE2_START)):
        with BuildLine():
            Line((-10, -49.793612856), (-10, -59.793612856))
            Line((-10, -59.793612856), (10, -59.793612856))
            Line((10, -59.793612856), (10, -49.793612856))
            ThreePointArc((10, -49.793612856), (0, -39.793612856), (-10, -49.793612856))
        make_face()
    extrude(amount=-CUT_EXTRUDE2_DEPTH, mode=Mode.SUBTRACT)

    # Sketch5 → Boss-Extrude5 (add)
    with BuildSketch(Plane(origin=(0, 0, 33), x_dir=(-1, 0, 0), z_dir=(0, 0, -1))):
        with BuildLine():
            Line((-15, -49.793612856), (-15, -59.793612856))
            Line((-15, -59.793612856), (-10, -59.793612856))
            Line((-10, -59.793612856), (-10, -49.793612856))
            ThreePointArc((-10, -49.793612856), (0, -39.793612856), (10, -49.793612856))
            Line((10, -49.793612856), (10, -59.793612856))
            Line((10, -59.793612856), (15, -59.793612856))
            Line((15, -59.793612856), (15, -49.793612856))
            ThreePointArc((15, -49.793612856), (0, -34.793612856), (-15, -49.793612856))
        make_face()
    extrude(amount=BOSS_EXTRUDE5_DEPTH)

    # Sketch7 → Cut-Extrude3 (cut)
    with BuildSketch(Plane.XY.offset(41)):
        Polygon((30, -39.793612856), (30, -59.793612856), (10, -59.793612856), align=None)
        Polygon((-30, -39.793612856), (-30, -59.793612856), (-10, -59.793612856), align=None)
    extrude(amount=-CUT_EXTRUDE3_DEPTH, mode=Mode.SUBTRACT)

    # Fillet5
    fillet5_edges = [part.edges().sort_by_distance(p)[0] for p in [
        (-30, 20.206387144, 37),
        (-30, 20.206387144, 4),
        (30, 20.206387144, 4),
        (30, 20.206387144, 37),
    ]]
    fillet(fillet5_edges, radius=FILLET5_R)


solid = part.part
